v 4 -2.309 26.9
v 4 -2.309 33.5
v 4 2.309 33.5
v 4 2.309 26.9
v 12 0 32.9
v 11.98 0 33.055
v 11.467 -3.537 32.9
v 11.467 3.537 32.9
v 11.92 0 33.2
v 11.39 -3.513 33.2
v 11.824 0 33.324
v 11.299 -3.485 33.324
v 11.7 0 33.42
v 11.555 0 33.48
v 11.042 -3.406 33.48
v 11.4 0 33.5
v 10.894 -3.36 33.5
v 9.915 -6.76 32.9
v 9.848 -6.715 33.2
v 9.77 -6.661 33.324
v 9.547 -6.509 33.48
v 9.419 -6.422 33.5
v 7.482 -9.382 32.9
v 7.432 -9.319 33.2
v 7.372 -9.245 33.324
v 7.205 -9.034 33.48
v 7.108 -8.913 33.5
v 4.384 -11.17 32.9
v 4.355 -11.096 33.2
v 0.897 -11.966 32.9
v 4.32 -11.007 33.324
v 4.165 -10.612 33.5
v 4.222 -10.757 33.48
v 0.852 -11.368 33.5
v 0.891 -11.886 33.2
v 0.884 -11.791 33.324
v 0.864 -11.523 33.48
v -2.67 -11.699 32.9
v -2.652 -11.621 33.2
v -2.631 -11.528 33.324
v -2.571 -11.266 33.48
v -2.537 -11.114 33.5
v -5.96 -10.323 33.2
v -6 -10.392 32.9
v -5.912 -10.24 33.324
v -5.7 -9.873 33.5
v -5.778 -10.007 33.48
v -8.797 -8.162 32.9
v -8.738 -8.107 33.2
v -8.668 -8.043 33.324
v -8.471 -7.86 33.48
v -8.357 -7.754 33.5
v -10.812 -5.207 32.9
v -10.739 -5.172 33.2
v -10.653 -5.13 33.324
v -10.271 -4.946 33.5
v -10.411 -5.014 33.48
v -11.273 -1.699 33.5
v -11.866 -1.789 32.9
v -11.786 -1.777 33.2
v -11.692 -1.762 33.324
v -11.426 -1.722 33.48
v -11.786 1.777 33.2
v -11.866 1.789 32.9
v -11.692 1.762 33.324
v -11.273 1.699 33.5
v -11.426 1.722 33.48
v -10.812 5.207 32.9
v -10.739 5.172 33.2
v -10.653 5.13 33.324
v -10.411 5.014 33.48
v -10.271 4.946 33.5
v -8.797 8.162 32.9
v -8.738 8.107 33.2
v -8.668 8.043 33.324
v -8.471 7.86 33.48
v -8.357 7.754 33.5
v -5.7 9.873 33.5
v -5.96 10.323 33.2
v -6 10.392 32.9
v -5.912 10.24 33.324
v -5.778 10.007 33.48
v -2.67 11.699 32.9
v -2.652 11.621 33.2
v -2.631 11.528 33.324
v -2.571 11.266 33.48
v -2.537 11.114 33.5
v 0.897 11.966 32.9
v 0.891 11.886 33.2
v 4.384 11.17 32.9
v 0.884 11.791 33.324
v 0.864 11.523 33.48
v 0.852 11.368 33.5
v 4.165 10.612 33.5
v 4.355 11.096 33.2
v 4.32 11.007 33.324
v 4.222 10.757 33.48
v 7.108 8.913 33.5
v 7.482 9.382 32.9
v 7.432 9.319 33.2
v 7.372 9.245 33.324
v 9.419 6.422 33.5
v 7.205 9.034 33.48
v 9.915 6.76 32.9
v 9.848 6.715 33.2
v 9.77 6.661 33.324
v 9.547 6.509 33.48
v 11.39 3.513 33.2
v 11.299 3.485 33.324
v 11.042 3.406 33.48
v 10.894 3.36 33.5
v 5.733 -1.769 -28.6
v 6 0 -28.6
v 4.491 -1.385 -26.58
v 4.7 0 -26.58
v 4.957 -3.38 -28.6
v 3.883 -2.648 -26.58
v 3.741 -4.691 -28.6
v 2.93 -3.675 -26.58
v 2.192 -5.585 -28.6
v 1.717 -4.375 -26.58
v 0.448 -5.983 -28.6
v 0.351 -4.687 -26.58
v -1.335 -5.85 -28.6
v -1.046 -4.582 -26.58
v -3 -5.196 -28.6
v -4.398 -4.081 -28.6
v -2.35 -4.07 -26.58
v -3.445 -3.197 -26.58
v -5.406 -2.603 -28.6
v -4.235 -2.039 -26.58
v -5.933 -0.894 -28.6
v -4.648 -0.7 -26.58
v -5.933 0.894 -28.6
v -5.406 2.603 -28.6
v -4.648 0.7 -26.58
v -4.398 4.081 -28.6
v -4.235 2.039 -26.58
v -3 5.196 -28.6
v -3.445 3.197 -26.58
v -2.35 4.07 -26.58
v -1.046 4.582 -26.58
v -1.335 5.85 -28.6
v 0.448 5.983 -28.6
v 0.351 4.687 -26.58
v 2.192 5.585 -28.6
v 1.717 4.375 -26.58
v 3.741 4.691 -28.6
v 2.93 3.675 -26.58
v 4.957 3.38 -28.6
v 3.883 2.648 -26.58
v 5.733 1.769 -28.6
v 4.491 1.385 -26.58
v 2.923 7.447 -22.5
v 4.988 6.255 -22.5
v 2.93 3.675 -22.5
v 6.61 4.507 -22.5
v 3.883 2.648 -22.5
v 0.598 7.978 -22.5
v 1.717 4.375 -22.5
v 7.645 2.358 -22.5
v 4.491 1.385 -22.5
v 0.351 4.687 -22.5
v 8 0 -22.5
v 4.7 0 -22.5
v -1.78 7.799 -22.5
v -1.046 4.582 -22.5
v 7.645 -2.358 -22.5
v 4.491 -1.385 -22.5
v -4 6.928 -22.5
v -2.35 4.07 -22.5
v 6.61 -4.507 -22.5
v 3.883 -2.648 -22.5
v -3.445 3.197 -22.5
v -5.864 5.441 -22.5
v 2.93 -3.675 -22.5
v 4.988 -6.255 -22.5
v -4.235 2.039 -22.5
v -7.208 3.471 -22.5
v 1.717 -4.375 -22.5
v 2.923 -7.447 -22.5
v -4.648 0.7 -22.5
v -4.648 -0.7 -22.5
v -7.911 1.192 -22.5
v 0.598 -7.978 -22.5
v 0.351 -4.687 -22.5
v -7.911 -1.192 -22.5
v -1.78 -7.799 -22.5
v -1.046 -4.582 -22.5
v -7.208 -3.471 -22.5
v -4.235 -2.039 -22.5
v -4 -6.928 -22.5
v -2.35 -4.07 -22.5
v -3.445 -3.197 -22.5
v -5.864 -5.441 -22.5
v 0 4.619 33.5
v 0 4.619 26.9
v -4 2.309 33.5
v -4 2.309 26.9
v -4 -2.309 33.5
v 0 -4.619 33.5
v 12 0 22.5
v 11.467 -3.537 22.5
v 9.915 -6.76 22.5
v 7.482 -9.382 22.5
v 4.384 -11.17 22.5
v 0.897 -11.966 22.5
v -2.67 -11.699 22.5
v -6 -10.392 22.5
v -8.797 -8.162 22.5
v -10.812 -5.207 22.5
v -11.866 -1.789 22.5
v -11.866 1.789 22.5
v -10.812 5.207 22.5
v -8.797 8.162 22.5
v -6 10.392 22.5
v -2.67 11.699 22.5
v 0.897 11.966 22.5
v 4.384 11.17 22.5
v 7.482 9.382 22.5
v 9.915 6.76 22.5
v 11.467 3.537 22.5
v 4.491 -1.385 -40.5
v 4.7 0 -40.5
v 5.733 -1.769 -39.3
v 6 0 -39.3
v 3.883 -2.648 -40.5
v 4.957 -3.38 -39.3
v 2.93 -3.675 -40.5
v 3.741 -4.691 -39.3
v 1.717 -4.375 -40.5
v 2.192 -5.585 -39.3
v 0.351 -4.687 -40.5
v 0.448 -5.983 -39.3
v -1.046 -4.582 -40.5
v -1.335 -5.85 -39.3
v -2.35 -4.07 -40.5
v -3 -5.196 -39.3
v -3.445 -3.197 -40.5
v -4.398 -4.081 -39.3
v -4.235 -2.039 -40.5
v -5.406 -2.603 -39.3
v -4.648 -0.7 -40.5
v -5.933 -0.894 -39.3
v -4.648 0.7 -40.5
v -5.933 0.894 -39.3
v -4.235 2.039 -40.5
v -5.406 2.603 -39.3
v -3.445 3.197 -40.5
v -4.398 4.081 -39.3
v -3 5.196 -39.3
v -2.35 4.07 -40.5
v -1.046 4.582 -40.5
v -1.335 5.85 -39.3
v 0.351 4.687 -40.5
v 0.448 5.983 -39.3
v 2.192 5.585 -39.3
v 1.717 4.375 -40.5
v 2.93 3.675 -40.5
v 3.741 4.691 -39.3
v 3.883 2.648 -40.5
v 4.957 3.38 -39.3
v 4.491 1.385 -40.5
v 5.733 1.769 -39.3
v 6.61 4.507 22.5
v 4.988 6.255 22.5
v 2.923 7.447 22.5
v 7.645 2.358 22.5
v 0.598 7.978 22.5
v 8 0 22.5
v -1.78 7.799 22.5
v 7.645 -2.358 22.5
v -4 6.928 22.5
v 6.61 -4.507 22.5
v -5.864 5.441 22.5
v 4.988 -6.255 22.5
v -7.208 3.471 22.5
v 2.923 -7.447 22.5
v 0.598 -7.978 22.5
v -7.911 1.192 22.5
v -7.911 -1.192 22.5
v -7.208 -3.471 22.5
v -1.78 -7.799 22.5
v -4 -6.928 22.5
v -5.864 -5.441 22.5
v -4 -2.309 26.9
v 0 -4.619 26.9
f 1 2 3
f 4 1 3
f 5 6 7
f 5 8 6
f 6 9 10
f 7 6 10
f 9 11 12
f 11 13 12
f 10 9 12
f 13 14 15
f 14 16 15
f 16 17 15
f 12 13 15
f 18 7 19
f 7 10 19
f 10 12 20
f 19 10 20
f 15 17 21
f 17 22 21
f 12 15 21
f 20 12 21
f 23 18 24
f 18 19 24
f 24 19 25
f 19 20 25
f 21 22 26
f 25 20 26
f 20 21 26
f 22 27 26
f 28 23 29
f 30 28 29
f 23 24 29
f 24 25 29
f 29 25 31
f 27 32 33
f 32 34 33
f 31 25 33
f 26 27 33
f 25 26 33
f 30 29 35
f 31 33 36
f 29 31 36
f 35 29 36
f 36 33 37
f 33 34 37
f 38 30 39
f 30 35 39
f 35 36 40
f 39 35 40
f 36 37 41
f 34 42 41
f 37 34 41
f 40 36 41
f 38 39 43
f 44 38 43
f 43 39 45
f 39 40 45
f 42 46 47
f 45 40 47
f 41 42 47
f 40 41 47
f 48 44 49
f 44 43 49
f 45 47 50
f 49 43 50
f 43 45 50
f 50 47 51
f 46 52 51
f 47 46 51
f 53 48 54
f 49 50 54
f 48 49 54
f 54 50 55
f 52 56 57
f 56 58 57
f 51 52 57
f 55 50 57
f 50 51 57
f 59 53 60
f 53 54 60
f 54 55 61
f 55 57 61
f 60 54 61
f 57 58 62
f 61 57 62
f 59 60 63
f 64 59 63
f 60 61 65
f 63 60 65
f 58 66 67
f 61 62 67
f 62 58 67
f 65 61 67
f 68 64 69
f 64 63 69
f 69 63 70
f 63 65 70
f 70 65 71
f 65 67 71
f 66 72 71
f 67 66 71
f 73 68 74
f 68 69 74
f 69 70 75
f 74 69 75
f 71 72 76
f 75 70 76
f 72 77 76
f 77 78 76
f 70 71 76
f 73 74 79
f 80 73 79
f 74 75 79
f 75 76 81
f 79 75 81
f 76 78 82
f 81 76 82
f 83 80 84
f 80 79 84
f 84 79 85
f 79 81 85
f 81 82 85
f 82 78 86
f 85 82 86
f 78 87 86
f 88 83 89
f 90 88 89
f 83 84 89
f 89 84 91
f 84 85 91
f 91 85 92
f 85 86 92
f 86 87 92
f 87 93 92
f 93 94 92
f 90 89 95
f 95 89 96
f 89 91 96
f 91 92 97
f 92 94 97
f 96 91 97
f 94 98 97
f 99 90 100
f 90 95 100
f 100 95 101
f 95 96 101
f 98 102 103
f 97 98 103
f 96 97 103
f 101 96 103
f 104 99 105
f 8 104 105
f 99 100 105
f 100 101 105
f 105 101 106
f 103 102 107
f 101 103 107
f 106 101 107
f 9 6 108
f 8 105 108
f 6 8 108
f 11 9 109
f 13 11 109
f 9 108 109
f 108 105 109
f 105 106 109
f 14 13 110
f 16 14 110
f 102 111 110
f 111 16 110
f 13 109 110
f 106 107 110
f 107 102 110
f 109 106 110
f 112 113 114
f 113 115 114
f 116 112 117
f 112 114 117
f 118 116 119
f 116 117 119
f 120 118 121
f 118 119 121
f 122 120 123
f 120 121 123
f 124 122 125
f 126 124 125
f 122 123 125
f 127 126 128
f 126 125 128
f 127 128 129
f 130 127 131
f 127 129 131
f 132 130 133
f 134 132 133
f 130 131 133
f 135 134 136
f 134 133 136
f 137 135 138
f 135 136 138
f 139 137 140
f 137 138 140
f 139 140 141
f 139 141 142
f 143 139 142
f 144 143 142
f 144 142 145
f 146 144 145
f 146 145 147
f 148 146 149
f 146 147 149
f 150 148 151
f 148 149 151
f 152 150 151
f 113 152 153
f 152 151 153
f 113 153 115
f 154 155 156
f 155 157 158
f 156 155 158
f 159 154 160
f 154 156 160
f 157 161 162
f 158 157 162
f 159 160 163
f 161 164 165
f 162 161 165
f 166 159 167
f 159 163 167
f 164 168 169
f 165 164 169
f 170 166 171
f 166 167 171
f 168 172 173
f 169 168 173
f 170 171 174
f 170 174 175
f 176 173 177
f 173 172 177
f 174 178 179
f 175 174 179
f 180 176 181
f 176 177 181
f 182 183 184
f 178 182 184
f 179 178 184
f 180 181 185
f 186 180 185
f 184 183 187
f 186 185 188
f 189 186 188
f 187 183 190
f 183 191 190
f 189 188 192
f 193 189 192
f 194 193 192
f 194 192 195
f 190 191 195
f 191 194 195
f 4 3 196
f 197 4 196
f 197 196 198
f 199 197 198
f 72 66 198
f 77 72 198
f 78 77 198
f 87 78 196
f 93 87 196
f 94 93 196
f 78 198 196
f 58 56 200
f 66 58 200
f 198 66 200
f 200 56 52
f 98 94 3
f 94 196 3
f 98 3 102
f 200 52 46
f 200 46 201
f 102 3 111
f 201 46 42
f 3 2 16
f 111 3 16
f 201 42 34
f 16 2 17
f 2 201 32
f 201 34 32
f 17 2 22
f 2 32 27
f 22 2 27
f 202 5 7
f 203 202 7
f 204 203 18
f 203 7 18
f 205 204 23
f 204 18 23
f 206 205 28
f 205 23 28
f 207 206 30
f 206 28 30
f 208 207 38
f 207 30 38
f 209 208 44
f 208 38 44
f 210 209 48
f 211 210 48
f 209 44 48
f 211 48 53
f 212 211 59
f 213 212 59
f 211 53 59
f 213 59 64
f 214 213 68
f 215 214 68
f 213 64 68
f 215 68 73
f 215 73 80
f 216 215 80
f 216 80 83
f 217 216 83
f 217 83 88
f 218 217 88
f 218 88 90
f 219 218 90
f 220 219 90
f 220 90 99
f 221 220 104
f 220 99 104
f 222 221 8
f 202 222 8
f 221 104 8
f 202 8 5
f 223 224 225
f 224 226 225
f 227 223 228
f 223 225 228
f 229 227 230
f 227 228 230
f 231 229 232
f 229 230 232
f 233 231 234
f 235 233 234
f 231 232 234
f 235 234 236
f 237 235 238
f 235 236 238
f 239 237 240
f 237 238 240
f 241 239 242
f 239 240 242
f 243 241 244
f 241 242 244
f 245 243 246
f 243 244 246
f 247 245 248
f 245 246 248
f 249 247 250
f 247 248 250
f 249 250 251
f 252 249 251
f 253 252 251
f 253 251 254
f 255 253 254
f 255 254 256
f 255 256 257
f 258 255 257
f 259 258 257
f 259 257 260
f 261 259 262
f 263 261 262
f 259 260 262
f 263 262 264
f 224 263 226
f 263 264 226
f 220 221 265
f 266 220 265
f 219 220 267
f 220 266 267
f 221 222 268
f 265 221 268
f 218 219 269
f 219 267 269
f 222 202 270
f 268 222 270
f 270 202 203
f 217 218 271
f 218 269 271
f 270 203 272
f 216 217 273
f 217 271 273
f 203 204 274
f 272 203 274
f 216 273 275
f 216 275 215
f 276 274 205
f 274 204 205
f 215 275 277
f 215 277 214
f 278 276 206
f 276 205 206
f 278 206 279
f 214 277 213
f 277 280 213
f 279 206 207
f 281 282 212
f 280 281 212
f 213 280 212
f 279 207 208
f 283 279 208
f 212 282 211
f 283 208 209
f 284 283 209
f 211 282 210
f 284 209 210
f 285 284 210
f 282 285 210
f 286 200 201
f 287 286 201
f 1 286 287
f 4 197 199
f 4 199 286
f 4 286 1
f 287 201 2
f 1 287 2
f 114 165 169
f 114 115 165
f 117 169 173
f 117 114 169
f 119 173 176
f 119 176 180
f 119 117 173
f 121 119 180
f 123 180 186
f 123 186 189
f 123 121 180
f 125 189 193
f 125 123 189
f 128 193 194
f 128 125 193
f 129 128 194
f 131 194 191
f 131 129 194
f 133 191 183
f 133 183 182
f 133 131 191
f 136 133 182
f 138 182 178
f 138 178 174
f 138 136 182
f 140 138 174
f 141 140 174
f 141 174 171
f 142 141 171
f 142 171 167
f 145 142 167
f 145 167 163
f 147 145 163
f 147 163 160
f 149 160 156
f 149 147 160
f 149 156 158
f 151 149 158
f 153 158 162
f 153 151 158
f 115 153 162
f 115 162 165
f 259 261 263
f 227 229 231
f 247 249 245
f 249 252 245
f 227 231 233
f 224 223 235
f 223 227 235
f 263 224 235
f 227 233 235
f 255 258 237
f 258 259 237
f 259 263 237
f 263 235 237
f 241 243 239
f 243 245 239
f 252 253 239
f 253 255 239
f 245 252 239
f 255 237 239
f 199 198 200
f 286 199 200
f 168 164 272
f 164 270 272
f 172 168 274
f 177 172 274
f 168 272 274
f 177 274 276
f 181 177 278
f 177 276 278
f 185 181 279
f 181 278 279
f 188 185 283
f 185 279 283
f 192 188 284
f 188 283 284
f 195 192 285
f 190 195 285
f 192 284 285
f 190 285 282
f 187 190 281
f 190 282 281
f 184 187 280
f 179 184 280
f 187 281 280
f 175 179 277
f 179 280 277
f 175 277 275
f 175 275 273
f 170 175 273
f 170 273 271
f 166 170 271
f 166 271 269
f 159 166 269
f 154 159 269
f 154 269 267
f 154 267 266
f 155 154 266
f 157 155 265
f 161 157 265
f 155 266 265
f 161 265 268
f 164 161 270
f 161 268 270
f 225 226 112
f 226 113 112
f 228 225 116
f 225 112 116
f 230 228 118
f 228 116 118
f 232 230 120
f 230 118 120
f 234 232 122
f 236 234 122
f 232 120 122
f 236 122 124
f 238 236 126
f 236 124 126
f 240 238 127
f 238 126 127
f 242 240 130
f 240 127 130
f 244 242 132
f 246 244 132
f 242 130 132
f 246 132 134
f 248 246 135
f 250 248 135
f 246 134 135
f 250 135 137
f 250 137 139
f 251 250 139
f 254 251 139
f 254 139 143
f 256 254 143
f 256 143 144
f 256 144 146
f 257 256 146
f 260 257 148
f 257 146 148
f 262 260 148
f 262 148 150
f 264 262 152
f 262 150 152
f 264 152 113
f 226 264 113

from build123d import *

# Parameters (mm, degrees)
SZKIC1_W                   = 4.7
SZKIC1_H                   = 4.08
WYTNIJ_WYCI_GNI_CIE1_DEPTH = 6.6
ZAOKR_GLENIE1_R            = 0.6


with BuildPart() as part:
    # Szkic1 → Obrót1 (revolve)
    with BuildSketch(Plane(origin=(0, 0, 0), x_dir=(1, 0, 0), z_dir=(0, 1, 0)), mode=Mode.PRIVATE) as obr_t1_sk:
        Polygon((0, -33.5), (0, -22.5), (-8, -22.5), (-12, -22.5), (-12, -33.5), align=None)
        Polygon((0, -22.5), (0, 22.5), (-4.7, 22.5), (-8, 22.5), (-8, -22.5), align=None)
        with Locations((-2.35, 24.54)):
            Rectangle(SZKIC1_W, SZKIC1_H)
        Polygon((-4.7, 26.58), (0, 26.58), (0, 40.5), (-4.7, 40.5), (-6, 39.3), (-6, 28.6), align=None)
    revolve(obr_t1_sk.sketch.rotate(Axis((0, 0, 33.5), (0, 0, -1)), 180), axis=Axis((0, 0, 33.5), (0, 0, -1)))

    # Szkic2 → Wytnij-wyciągnięcie1 (cut)
    with BuildSketch(Plane.XY.offset(33.5)):
        Polygon((4, 2.309401077), (0, 4.618802154), (-4, 2.309401077), (-4, -2.309401077), (0, -4.618802154), (4, -2.309401077), align=None)
    extrude(amount=-WYTNIJ_WYCI_GNI_CIE1_DEPTH, mode=Mode.SUBTRACT)

    # Zaokrąglenie1
    zaokr_glenie1_edges = [part.edges().sort_by_distance(p)[0] for p in [
        (-12, 0, 33.5),
    ]]
    fillet(zaokr_glenie1_edges, radius=ZAOKR_GLENIE1_R)


solid = part.part
